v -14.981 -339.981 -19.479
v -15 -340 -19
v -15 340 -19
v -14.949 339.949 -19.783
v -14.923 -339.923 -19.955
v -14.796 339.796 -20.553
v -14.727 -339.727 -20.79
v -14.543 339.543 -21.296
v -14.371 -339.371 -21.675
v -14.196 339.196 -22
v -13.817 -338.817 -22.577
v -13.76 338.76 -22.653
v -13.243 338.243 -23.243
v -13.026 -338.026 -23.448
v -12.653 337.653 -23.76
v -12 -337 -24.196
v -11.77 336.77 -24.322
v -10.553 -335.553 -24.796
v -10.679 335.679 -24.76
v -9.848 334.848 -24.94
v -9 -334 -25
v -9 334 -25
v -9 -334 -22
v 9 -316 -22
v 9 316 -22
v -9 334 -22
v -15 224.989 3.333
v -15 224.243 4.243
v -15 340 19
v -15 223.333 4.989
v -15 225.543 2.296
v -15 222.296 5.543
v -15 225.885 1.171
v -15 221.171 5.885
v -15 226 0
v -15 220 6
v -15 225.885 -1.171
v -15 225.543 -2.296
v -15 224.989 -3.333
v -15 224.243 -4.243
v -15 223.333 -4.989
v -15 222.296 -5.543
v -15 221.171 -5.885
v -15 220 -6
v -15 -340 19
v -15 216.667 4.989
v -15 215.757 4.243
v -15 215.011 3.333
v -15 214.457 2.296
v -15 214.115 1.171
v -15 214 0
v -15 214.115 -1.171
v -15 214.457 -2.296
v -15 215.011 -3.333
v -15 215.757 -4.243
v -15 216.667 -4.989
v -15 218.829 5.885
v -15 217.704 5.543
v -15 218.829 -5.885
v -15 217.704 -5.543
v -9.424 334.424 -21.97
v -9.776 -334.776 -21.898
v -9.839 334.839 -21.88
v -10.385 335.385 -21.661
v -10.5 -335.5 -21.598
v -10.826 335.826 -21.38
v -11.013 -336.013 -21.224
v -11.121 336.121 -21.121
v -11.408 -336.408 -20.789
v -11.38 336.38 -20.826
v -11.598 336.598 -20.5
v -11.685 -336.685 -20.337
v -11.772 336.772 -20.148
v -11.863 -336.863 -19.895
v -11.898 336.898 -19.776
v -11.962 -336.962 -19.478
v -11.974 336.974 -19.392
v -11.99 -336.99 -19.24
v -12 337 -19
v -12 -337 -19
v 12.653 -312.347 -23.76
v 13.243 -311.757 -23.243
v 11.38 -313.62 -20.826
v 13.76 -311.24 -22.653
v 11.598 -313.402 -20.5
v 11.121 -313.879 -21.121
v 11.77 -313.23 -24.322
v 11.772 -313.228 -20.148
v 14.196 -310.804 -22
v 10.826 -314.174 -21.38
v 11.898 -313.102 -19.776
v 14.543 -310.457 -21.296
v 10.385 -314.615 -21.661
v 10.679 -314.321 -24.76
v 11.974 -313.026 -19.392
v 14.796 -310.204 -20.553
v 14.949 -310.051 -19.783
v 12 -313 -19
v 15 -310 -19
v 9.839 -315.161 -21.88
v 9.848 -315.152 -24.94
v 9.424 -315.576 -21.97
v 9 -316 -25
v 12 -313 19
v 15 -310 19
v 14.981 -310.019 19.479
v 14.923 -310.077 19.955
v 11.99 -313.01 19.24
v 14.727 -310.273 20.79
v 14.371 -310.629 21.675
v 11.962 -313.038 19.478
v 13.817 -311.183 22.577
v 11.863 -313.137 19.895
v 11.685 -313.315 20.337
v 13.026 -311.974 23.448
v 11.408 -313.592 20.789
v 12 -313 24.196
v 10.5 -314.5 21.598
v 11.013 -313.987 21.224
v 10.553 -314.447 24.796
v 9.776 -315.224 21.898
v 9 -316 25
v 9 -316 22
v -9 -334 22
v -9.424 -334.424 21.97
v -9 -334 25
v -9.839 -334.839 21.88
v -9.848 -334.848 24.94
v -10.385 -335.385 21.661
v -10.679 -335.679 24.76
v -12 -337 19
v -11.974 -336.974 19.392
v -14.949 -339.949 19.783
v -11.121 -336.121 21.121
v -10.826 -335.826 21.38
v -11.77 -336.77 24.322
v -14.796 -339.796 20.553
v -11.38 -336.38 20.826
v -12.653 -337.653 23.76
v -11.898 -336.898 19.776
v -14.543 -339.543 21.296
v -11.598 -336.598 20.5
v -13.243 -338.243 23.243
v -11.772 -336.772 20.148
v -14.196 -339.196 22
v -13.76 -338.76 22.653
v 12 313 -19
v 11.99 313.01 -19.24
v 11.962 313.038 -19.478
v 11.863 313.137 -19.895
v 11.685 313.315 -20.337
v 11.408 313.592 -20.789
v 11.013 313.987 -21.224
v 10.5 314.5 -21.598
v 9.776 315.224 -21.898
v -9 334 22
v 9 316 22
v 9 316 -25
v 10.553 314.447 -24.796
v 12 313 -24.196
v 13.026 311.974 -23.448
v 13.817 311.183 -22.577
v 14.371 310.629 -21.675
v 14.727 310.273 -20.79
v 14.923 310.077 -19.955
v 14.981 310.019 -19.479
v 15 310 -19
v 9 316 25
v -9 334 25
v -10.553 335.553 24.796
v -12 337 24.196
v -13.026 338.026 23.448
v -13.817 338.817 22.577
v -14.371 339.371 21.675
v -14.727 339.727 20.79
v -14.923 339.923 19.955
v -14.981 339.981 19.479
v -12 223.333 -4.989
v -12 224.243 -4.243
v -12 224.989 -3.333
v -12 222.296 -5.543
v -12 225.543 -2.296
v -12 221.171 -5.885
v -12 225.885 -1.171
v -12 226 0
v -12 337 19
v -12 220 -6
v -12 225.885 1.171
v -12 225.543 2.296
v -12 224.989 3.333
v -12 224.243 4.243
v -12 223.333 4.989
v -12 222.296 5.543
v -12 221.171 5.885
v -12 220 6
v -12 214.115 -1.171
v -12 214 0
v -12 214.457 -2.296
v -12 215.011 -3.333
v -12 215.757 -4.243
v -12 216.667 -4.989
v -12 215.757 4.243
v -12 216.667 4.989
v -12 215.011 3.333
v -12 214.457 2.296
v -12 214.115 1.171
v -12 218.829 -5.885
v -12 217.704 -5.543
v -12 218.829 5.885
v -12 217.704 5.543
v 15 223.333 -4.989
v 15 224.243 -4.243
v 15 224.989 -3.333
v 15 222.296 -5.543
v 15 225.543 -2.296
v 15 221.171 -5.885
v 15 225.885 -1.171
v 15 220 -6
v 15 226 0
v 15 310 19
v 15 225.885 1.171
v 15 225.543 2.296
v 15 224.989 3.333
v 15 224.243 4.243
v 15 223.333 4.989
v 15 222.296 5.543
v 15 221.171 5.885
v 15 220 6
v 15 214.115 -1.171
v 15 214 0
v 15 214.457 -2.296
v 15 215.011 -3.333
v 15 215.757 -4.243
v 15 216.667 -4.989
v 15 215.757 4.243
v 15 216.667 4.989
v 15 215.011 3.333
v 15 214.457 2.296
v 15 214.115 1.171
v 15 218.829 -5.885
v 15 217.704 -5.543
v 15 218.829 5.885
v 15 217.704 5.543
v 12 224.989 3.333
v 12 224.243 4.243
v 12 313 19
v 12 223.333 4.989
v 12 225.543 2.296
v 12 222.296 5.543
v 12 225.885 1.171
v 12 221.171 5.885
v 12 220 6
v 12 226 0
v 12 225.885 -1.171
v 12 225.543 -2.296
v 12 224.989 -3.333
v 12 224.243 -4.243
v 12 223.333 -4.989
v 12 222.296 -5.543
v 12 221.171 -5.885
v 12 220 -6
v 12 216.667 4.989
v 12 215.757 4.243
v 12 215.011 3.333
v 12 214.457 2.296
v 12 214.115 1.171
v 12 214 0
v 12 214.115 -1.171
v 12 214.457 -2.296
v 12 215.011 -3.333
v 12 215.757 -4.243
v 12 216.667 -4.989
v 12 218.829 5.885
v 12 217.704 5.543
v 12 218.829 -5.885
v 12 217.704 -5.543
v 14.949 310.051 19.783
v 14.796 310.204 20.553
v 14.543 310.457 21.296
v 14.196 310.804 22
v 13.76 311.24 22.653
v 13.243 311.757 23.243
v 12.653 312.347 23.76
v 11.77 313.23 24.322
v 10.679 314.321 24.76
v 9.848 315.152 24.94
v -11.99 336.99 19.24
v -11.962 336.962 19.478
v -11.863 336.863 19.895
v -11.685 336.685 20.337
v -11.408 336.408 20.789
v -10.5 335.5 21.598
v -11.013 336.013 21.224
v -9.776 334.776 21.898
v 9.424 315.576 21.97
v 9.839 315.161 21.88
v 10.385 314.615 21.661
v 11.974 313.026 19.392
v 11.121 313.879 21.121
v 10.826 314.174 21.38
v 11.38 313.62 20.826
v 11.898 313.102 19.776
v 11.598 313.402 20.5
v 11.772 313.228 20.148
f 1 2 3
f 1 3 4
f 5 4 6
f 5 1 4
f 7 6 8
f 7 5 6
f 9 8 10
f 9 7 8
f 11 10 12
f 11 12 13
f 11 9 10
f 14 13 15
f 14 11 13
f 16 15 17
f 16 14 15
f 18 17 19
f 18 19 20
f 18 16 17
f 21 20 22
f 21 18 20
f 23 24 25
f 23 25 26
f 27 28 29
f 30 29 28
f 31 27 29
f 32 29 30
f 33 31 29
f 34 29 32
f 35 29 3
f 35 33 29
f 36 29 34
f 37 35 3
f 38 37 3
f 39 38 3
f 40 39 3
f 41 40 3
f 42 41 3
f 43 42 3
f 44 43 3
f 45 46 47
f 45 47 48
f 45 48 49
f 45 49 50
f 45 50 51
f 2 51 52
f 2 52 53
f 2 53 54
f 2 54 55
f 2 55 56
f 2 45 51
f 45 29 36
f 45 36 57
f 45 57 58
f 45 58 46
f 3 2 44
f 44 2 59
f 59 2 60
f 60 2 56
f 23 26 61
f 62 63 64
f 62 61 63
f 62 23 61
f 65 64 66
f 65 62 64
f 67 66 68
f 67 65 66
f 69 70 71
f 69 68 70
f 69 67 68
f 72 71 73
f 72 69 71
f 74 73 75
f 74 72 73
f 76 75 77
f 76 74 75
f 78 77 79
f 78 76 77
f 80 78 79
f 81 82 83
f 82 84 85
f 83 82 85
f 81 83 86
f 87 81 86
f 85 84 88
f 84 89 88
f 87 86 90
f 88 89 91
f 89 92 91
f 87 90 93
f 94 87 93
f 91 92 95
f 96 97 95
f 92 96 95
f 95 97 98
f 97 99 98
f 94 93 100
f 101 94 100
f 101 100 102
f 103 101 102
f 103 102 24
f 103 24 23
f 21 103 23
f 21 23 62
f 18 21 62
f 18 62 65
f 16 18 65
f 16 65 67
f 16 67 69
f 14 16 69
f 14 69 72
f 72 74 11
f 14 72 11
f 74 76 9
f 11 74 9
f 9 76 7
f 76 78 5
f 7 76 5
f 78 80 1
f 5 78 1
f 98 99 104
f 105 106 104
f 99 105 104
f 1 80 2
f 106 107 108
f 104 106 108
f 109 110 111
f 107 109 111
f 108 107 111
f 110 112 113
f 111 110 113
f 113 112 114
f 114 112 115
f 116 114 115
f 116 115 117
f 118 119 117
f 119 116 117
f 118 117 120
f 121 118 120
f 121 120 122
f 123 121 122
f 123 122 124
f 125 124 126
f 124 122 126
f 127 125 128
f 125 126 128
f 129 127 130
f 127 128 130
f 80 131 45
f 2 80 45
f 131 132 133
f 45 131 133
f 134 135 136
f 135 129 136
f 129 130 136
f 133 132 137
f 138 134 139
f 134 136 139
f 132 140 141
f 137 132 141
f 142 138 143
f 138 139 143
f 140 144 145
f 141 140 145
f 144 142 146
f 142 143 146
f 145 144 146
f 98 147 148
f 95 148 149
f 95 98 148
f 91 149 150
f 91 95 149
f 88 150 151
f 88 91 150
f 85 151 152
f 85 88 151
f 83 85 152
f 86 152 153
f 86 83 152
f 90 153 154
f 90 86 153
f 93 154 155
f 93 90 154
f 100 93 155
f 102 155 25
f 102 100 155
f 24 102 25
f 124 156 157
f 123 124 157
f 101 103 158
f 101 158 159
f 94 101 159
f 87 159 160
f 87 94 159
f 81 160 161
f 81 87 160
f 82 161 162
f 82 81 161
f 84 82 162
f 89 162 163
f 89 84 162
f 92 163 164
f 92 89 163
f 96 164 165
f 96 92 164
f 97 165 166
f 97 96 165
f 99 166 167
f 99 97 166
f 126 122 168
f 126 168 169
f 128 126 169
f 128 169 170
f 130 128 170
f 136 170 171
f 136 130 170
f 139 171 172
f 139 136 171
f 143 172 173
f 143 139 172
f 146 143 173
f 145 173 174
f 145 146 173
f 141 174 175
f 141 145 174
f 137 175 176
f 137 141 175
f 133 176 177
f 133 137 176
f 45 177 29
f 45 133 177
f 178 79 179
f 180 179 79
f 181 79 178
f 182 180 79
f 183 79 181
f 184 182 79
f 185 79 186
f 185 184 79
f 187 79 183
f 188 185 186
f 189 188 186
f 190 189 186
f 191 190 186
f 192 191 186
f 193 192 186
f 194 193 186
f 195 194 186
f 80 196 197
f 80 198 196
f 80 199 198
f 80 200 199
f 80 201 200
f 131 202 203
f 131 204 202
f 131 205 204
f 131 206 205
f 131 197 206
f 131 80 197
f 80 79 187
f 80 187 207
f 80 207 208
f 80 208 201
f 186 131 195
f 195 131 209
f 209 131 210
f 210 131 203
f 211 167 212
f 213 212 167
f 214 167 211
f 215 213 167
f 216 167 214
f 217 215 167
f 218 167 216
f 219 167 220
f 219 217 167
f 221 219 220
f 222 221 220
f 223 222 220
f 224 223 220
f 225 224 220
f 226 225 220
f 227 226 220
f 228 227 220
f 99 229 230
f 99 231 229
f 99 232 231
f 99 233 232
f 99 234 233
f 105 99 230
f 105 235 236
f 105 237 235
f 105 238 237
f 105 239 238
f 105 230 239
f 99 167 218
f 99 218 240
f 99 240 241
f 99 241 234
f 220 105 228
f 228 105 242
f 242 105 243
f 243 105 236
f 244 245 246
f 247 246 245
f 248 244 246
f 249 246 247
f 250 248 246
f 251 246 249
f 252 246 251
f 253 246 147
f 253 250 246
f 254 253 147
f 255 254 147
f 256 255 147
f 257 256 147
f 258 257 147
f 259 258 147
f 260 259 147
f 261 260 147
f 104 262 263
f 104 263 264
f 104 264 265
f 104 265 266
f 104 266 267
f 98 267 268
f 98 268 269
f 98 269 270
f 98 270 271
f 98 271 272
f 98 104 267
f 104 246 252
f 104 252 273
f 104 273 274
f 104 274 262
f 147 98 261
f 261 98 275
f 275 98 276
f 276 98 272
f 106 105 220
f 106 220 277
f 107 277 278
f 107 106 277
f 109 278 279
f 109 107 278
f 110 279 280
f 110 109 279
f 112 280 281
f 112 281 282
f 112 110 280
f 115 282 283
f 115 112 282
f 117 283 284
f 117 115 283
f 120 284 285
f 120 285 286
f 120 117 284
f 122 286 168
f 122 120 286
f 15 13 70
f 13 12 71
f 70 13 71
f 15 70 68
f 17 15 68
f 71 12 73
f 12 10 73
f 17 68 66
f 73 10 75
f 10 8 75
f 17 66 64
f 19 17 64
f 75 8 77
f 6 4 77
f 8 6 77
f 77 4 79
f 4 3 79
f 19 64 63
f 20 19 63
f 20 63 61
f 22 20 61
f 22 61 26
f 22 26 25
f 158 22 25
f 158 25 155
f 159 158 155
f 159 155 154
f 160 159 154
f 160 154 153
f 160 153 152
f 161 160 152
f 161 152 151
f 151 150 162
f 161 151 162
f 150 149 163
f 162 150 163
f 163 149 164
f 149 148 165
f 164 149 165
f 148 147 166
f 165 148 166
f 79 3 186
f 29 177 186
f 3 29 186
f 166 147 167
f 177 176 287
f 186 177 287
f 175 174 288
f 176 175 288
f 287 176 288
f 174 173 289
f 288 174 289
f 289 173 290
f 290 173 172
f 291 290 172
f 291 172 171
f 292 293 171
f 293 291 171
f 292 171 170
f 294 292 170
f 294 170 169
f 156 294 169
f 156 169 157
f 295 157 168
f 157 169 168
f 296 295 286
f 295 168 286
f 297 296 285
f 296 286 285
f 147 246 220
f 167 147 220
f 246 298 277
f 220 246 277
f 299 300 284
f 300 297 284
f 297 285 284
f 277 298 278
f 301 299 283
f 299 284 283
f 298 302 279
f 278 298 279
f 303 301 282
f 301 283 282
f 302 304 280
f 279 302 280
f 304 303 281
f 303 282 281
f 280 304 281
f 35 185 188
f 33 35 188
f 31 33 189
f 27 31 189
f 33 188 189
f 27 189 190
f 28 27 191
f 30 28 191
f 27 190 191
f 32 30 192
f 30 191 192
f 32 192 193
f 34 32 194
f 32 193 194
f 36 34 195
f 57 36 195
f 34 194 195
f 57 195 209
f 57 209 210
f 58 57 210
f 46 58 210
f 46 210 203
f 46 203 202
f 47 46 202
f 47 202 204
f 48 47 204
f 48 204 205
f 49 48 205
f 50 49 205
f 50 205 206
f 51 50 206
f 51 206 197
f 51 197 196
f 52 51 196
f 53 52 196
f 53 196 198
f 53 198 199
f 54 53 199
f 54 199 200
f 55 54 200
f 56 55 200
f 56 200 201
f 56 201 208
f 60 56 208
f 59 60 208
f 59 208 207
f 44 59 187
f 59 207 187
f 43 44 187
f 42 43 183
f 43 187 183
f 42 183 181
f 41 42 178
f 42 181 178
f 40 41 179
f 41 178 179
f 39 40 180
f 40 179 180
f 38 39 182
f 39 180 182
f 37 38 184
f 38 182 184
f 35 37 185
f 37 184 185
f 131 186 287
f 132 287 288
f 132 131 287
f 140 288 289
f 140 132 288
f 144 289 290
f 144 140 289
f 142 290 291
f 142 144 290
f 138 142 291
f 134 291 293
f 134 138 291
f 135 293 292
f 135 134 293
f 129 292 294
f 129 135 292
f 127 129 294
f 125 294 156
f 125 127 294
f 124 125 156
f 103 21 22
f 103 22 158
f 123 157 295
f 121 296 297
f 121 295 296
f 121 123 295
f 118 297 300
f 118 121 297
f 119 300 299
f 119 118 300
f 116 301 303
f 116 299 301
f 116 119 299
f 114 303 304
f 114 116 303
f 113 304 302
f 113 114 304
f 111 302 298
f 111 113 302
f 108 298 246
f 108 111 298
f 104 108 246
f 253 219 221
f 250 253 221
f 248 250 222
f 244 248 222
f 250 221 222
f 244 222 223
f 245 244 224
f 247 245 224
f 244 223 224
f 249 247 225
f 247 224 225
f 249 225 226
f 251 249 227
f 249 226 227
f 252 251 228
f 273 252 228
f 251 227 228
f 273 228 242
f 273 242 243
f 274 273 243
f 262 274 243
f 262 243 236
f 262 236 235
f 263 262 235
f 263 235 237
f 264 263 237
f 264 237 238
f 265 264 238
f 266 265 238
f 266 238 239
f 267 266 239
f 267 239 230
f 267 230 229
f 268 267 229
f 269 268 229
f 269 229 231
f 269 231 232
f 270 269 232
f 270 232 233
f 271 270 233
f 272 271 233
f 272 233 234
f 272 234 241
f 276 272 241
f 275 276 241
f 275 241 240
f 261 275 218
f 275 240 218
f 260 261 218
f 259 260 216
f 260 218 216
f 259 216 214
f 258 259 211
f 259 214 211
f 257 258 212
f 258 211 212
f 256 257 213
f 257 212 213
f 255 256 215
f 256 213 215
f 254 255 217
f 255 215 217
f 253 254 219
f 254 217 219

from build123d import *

# Parameters (mm, degrees)
F1_DEPTH = 340
F3_DEPTH = 50
F5_D     = 12


with BuildPart() as f1:
    # F0 (on Front) → F1 (new body, symmetric)
    with BuildSketch(Plane.XZ):
        with BuildLine():
            ThreePointArc((15, 19), (13.2426406871, 23.2426406871), (9, 25))
            Line((9, 25), (-9, 25))
            ThreePointArc((-9, 25), (-13.2426406871, 23.2426406871), (-15, 19))
            Line((-15, 19), (-15, -19))
            ThreePointArc((-15, -19), (-13.2426406871, -23.2426406871), (-9, -25))
            Line((-9, -25), (9, -25))
            ThreePointArc((9, -25), (13.2426406871, -23.2426406871), (15, -19))
            Line((15, -19), (15, 19))
        make_face()
        with BuildLine():
            Line((-9, 22), (9, 22))
            ThreePointArc((9, 22), (11.1213203436, 21.1213203436), (12, 19))
            Line((12, 19), (12, -19))
            ThreePointArc((12, -19), (11.1213203436, -21.1213203436), (9, -22))
            Line((9, -22), (-9, -22))
            ThreePointArc((-9, -22), (-11.1213203436, -21.1213203436), (-12, -19))
            Line((-12, -19), (-12, 19))
            ThreePointArc((-12, 19), (-11.1213203436, 21.1213203436), (-9, 22))
        make_face(mode=Mode.SUBTRACT)
    extrude(amount=F1_DEPTH, both=True)

    # F2 (on face) → F3 (cut, through all)
    with BuildSketch(Plane.XY.offset(25)):
        Polygon((-9, -340), (-9, -334), (-15, -340), align=None)
        Polygon((9, -340), (9, -316), (-9, -334), (-9, -340), align=None)
        Polygon((15, -310), (9, -316), (9, -340), (15, -340), align=None)
        Polygon((-15, 340), (-9, 334), (-9, 340), align=None)
        Polygon((-9, 334), (9, 316), (9, 340), (-9, 340), align=None)
        Polygon((9, 316), (15, 310), (15, 340), (9, 340), align=None)
    extrude(amount=-F3_DEPTH, mode=Mode.SUBTRACT)

    # F5 (through all)
    with Locations(Plane(origin=(-15, 0, 0), x_dir=(0, -1, 0), z_dir=(-1, 0, 0))):
        with Locations((-220, 0)):
            Hole(F5_D / 2)


solid = f1.part
